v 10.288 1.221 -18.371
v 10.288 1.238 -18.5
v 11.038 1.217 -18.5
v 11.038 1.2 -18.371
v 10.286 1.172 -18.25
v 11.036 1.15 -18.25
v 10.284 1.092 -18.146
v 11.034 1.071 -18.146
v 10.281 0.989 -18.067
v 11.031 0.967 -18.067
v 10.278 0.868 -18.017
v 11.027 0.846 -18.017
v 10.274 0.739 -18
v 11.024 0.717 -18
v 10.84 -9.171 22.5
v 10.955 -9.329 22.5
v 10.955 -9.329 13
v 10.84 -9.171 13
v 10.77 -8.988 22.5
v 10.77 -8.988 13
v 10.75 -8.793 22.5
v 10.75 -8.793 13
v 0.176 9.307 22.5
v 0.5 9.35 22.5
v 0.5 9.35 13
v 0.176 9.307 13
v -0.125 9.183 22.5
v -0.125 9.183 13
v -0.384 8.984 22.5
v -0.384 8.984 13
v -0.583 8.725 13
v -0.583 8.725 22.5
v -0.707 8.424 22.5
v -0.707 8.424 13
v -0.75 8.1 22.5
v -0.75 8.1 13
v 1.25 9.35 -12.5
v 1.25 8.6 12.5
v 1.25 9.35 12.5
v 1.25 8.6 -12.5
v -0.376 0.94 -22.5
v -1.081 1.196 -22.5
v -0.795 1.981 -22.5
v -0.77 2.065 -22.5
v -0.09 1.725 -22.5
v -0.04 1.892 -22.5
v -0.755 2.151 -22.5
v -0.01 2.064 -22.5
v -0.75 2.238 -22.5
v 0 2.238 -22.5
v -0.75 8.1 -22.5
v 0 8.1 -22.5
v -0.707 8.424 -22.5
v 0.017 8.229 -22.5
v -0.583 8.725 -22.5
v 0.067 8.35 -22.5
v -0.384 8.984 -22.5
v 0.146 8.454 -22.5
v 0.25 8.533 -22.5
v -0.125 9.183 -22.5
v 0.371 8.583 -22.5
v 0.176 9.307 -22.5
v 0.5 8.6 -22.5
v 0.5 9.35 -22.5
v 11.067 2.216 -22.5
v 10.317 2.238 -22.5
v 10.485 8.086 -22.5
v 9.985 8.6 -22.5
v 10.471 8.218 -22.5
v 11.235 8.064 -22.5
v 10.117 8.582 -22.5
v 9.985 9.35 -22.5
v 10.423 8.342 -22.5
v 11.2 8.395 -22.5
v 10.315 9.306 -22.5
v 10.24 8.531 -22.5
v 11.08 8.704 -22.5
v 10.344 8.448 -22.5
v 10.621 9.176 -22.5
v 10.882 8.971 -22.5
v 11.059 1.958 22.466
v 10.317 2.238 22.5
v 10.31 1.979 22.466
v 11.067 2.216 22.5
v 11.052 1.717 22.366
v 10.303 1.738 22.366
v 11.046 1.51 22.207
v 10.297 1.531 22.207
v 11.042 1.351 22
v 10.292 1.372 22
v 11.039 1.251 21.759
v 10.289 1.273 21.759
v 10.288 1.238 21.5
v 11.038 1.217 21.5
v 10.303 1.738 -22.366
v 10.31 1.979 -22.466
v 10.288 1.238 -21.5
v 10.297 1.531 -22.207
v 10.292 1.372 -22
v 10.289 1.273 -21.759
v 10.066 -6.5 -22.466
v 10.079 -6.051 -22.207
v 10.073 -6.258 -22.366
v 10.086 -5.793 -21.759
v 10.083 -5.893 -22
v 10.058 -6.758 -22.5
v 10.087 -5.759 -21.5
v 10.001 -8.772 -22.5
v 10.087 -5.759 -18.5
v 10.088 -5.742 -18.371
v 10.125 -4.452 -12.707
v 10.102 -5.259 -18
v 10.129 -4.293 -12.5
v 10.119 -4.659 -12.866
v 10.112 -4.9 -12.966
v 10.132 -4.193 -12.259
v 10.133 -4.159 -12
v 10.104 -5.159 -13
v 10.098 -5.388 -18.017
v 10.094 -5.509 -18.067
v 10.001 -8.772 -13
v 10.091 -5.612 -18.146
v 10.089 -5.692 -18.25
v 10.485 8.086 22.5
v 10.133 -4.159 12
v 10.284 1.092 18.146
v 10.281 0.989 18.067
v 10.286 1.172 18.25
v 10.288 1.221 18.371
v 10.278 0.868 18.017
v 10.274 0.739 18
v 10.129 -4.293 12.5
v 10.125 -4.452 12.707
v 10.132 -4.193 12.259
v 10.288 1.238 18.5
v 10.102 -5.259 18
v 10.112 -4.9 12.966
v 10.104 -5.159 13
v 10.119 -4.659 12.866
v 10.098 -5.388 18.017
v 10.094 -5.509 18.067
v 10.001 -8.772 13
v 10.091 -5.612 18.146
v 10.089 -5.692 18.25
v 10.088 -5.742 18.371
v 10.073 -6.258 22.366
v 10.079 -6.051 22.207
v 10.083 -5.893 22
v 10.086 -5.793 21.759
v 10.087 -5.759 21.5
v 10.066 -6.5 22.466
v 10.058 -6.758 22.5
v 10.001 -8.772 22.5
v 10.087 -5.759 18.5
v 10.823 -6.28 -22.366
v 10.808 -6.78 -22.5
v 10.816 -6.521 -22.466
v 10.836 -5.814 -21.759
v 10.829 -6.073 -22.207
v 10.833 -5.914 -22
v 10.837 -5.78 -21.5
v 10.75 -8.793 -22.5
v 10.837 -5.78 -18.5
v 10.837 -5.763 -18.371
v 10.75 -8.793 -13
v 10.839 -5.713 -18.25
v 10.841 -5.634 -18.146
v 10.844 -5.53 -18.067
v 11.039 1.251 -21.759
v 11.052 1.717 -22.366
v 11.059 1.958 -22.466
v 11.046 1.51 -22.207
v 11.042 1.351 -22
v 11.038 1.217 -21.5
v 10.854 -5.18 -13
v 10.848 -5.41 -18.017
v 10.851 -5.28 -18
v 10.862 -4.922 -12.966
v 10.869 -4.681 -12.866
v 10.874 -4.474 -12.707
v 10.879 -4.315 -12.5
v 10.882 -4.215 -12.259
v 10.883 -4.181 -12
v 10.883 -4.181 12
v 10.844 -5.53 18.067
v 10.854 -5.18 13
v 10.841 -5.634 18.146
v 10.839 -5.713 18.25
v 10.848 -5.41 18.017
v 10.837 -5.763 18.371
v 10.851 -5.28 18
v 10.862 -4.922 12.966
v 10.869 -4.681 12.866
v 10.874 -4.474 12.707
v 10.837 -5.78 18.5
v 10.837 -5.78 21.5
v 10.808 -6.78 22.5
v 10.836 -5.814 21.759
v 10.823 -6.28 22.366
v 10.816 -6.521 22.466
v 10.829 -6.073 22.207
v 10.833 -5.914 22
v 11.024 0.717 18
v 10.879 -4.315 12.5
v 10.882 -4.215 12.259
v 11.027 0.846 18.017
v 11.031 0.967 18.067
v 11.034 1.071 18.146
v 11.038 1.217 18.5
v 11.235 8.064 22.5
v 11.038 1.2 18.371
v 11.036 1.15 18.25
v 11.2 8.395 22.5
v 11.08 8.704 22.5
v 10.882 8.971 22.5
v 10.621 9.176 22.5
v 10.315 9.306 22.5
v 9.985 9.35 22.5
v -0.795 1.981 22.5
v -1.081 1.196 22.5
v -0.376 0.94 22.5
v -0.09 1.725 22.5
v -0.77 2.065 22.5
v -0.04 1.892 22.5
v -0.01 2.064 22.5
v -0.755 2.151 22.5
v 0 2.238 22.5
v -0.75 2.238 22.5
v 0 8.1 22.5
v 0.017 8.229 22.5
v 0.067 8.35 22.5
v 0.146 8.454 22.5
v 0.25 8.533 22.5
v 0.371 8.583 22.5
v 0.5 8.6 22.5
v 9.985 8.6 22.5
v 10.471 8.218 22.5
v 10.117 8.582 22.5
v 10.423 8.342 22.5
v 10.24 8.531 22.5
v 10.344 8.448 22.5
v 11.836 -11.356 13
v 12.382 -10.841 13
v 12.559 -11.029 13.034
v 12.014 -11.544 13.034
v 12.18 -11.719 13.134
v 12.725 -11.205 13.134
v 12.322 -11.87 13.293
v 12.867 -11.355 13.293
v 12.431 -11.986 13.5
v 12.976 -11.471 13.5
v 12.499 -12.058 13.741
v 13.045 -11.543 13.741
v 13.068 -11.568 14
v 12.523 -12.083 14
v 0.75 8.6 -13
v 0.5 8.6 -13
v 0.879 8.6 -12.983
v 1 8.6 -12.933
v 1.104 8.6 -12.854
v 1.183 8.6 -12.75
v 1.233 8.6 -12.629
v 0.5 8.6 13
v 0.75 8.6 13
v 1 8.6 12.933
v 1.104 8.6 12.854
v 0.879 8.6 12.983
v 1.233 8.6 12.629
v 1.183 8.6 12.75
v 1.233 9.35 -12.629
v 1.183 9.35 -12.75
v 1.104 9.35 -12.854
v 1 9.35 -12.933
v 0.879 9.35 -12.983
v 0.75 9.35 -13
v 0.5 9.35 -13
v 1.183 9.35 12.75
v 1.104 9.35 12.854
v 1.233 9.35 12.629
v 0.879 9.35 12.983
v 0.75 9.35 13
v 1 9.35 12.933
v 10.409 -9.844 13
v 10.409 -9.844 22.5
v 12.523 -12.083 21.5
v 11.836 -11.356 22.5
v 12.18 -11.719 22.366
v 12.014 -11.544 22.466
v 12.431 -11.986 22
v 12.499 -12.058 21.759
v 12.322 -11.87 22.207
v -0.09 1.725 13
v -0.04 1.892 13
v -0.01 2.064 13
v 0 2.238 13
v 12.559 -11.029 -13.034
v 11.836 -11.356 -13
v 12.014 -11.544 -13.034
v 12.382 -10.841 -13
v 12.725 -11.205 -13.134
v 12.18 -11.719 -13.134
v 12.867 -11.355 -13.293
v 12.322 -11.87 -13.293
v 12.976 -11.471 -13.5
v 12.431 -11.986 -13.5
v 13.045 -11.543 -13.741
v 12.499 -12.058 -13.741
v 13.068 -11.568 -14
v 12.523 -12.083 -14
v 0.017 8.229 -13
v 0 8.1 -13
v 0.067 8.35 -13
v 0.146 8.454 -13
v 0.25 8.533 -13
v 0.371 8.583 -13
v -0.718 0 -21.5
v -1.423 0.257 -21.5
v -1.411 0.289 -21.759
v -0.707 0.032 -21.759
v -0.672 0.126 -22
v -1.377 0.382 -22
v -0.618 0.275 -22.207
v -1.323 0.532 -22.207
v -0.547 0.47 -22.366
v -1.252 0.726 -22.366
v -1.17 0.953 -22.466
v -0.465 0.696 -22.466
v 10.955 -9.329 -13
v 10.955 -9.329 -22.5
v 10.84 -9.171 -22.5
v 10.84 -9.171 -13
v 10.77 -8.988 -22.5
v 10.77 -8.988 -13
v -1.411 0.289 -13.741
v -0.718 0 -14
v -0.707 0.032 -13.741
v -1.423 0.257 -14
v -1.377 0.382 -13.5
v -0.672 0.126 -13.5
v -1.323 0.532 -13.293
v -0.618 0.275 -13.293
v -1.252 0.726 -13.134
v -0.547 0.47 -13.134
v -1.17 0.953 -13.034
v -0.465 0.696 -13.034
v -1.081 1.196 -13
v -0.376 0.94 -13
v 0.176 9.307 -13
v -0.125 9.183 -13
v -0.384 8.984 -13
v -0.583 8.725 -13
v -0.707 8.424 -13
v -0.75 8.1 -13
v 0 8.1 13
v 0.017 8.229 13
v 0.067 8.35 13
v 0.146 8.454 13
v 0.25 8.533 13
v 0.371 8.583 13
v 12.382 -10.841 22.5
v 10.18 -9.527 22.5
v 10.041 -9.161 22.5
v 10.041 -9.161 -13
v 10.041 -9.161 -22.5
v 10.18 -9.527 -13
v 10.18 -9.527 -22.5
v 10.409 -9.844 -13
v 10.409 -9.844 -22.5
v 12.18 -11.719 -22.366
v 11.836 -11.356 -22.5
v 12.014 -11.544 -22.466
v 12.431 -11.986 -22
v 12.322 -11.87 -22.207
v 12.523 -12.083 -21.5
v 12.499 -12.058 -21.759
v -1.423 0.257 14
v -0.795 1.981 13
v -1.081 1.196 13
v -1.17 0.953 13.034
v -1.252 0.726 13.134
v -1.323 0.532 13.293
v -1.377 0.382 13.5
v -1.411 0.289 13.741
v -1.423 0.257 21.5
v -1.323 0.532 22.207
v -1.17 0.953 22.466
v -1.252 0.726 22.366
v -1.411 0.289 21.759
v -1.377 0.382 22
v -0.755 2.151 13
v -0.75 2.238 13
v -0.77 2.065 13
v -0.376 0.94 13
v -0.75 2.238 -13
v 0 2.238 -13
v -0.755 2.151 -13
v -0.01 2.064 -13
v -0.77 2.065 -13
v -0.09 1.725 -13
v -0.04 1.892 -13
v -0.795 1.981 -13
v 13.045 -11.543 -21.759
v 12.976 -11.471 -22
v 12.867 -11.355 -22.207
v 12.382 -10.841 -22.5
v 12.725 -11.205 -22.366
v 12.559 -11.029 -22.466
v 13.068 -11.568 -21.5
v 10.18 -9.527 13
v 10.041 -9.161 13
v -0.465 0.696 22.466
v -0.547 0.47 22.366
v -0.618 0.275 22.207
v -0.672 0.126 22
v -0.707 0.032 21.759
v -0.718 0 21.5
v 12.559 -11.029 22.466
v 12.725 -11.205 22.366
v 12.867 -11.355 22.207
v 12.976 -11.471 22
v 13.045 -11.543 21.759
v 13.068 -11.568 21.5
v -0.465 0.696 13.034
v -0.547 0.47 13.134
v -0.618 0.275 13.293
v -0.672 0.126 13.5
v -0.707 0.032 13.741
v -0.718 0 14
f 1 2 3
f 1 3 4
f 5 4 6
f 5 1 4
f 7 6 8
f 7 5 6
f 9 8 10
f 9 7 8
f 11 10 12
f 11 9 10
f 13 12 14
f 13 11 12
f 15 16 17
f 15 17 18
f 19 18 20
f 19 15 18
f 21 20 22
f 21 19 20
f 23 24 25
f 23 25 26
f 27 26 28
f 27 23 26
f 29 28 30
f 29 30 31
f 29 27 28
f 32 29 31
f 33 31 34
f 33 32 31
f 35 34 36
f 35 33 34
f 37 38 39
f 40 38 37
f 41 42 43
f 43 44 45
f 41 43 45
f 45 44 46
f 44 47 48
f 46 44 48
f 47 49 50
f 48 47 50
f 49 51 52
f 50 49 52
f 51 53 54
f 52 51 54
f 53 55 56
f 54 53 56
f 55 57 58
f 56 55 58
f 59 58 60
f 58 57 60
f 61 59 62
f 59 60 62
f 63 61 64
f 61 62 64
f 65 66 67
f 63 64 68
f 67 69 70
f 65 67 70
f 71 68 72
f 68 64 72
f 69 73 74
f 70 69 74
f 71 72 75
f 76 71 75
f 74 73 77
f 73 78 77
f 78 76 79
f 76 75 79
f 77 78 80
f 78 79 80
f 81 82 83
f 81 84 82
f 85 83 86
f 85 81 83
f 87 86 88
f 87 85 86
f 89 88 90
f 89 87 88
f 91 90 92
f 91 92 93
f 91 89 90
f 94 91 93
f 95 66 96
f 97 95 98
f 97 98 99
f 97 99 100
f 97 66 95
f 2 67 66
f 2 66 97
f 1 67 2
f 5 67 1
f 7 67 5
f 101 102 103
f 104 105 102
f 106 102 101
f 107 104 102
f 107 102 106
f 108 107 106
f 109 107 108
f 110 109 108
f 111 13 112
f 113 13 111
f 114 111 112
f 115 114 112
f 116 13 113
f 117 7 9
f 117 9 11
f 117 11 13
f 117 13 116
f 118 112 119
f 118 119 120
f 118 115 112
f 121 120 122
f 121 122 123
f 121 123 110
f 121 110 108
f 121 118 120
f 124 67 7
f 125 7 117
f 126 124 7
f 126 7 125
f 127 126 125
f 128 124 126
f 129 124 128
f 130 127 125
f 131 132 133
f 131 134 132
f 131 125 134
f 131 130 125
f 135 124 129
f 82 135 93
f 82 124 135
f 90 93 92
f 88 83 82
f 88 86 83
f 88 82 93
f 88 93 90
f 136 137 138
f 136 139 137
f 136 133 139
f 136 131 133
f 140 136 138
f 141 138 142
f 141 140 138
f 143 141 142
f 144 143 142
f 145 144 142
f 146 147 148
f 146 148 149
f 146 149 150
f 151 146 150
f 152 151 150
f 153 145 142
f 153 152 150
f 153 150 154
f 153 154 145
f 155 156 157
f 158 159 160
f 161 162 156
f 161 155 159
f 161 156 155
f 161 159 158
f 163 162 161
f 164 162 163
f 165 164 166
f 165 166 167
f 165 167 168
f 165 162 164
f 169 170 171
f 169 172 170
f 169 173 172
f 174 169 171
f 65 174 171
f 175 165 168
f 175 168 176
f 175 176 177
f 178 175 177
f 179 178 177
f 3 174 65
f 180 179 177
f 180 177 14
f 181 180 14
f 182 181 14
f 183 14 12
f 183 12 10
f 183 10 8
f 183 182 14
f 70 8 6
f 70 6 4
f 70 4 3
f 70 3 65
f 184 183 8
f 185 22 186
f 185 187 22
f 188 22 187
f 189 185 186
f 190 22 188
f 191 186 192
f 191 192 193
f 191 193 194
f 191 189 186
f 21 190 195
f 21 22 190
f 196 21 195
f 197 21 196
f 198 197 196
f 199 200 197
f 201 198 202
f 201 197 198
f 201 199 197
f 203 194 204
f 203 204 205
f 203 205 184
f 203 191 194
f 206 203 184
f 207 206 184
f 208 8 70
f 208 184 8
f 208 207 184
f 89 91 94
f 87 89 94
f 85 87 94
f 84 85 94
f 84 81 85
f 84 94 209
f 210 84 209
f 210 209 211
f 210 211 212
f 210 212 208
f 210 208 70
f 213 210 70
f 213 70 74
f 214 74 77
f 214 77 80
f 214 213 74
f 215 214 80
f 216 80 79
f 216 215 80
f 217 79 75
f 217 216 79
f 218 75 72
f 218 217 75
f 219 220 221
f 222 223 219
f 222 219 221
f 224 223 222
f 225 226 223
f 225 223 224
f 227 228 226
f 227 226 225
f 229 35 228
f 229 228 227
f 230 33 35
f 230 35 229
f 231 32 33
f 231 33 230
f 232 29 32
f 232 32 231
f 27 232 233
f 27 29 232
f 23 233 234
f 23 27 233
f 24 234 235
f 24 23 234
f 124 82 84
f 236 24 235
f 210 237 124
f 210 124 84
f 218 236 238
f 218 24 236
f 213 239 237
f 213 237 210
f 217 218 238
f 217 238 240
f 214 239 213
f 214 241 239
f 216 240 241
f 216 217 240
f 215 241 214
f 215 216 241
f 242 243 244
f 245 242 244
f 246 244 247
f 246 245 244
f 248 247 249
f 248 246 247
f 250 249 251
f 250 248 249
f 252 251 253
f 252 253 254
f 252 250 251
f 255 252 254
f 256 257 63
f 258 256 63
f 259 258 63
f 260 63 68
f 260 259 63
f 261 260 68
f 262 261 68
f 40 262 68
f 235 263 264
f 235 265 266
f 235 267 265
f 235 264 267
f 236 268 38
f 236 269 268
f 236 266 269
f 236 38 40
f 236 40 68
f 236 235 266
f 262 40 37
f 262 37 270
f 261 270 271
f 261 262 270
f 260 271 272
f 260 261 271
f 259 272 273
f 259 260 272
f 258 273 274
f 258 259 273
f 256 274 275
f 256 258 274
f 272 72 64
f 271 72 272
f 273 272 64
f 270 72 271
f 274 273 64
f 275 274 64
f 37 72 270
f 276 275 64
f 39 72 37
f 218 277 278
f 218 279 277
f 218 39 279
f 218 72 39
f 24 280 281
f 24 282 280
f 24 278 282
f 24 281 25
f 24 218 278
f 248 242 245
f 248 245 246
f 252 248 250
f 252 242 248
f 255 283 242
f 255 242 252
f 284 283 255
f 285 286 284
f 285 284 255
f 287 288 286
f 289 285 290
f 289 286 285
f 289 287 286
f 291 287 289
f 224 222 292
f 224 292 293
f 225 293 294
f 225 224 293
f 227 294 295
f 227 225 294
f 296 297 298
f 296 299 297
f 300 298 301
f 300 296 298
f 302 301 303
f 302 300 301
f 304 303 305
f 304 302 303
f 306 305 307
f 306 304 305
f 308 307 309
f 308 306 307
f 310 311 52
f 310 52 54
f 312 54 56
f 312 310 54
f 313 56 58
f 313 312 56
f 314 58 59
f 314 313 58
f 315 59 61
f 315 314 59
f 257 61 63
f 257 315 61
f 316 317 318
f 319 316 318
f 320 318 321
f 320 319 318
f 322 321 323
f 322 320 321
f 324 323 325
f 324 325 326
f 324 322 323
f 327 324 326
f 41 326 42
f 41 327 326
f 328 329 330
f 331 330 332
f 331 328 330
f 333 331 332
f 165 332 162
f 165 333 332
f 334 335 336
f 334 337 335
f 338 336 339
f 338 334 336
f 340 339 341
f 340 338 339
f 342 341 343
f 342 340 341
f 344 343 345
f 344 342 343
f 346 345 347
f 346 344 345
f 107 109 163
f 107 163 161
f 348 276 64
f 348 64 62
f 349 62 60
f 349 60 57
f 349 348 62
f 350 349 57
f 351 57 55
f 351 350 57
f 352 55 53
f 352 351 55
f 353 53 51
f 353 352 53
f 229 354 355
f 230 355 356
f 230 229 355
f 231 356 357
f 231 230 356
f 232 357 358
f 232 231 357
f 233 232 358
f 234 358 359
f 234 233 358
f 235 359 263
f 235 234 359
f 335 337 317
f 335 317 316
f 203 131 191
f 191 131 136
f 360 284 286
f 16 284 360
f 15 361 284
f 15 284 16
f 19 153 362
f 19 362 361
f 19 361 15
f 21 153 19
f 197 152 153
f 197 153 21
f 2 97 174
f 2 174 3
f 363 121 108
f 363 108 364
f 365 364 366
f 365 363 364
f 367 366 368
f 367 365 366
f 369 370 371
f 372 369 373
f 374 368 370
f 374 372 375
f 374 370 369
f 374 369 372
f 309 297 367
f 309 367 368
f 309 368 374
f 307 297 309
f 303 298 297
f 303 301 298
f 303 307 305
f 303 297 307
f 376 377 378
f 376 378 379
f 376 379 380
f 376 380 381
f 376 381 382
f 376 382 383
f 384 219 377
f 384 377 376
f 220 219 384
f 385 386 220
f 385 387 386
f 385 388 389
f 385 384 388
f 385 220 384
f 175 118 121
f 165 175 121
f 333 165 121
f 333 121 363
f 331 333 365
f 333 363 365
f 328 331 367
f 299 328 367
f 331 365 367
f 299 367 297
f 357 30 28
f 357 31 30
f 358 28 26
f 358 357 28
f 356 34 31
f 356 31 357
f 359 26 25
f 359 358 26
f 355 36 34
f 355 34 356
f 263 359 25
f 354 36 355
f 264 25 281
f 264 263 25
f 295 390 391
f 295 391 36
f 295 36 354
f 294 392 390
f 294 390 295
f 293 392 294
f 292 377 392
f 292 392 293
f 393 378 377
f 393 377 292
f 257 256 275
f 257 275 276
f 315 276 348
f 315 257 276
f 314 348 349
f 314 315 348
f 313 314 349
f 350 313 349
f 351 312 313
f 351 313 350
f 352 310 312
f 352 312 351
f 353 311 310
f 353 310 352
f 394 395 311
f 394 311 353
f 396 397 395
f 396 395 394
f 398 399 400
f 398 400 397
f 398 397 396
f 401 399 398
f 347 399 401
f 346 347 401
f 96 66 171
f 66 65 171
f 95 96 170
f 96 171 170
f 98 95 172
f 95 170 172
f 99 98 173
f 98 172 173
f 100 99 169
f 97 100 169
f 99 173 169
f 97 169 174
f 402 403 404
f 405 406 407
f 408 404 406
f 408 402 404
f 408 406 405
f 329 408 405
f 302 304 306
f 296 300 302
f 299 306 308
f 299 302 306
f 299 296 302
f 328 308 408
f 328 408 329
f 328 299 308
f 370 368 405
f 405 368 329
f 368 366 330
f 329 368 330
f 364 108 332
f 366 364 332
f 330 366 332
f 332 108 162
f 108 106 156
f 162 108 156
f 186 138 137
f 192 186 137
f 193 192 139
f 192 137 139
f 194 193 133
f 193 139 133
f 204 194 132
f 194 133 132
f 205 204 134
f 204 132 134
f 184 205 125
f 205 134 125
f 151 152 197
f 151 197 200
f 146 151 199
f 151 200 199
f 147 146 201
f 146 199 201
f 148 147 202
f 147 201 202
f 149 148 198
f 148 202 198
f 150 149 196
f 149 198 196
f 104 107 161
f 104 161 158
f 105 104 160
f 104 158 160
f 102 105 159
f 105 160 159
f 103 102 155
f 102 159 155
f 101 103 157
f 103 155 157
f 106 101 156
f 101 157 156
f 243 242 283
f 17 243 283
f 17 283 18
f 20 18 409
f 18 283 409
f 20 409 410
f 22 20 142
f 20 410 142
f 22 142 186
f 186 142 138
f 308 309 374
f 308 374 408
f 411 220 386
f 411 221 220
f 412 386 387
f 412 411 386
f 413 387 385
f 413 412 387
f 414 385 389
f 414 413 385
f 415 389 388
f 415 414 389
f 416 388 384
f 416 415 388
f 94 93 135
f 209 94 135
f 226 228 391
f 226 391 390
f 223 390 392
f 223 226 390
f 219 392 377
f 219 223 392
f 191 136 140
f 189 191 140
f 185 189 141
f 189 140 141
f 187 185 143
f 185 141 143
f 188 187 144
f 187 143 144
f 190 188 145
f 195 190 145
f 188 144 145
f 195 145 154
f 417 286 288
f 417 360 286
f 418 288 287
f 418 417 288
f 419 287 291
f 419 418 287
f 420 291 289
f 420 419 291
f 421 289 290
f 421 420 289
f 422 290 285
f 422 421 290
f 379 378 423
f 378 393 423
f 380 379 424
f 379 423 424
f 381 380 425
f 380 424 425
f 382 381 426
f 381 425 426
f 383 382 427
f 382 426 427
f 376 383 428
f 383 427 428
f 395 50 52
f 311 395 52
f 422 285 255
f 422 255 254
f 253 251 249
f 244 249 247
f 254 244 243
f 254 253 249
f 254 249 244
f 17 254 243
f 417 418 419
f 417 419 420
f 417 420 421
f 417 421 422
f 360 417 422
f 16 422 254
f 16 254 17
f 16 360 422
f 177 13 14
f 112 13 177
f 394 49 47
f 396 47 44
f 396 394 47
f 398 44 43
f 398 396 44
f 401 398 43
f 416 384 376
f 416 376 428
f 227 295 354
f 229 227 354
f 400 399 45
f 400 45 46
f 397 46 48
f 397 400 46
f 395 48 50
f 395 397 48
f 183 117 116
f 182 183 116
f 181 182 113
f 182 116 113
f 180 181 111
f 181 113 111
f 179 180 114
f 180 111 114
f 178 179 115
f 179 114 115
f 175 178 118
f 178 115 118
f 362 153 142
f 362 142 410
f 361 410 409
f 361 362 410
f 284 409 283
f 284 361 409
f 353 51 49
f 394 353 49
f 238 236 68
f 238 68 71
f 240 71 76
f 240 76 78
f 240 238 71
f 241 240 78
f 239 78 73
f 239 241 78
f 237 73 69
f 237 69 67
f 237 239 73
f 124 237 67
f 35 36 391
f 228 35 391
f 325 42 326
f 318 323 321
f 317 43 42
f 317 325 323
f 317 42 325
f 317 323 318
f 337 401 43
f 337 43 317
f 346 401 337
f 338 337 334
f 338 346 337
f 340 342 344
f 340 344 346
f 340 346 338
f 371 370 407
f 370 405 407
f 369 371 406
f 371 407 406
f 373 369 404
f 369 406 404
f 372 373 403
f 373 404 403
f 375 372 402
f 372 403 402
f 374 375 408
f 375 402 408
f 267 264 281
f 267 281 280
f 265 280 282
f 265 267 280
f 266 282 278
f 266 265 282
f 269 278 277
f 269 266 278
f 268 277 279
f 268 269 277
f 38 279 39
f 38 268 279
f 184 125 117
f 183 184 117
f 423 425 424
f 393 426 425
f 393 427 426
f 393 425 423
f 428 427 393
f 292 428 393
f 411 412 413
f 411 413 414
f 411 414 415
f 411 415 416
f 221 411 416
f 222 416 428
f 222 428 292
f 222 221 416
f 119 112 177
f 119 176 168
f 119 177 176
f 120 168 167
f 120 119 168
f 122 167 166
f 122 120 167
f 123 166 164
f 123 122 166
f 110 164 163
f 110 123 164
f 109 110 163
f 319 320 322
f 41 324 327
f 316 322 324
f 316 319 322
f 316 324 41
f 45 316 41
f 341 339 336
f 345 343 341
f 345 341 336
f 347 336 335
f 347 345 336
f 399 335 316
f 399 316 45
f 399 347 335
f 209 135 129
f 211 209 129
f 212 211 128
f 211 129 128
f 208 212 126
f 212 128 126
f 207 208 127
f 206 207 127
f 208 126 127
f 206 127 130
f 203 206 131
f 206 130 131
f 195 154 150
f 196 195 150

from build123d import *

# Parameters (mm, degrees)
BASE_FLANGE1_DEPTH = 22.5
CUT_EXTRUDE1_START = -9.35
CUT_EXTRUDE1_DEPTH = 9.35
CUT_EXTRUDE2_DEPTH = 28.952537171
FILLET_R1_R        = 1


# Read off the part's stored shape, not the designer's step: Cut-Extrude1
# Sheet-metal steps are written as plain solids
with BuildPart() as part:
    # Sketch1 → Base-Flange1 (new, symmetric)
    with BuildSketch(Plane.XY):
        with BuildLine():
            Line((-0.718242301, 0), (-0.090461069, 1.72481476))
            ThreePointArc((-0.090461069, 1.72481476), (-0.02278837, 1.977372708), (0, 2.237844975))
            Line((0, 2.237844975), (0, 8.1))
            ThreePointArc((0, 8.1), (0.146446609, 8.453553391), (0.5, 8.6))
            Line((0.5, 8.6), (9.985419886, 8.6))
            ThreePointArc((9.985419886, 8.6), (10.344017022, 8.448436644), (10.485213415, 8.085632378))
            Line((10.485213415, 8.085632378), (10.000619414, -8.771503263))
            ThreePointArc((10.000619414, -8.771503263), (10.098258212, -9.348572383), (10.409299492, -9.84434998))
            Line((10.409299492, -9.84434998), (12.522800458, -12.082961625))
            Line((12.522800458, -12.082961625), (13.068150712, -11.568089698))
            Line((13.068150712, -11.568089698), (10.954649746, -9.329478054))
            ThreePointArc((10.954649746, -9.329478054), (10.799129106, -9.081589256), (10.750309707, -8.793054696))
            Line((10.750309707, -8.793054696), (11.234903709, 8.064080946))
            ThreePointArc((11.234903709, 8.064080946), (10.881912725, 8.971091609), (9.985419886, 9.35))
            Line((9.985419886, 9.35), (0.5, 9.35))
            ThreePointArc((0.5, 9.35), (-0.383883476, 8.983883476), (-0.75, 8.1))
            Line((-0.75, 8.1), (-0.75, 2.237844975))
            ThreePointArc((-0.75, 2.237844975), (-0.761394185, 2.107608841), (-0.795230534, 1.981329867))
            Line((-0.795230534, 1.981329867), (-1.423011767, 0.256515107))
            Line((-1.423011767, 0.256515107), (-0.718242301, 0))
        make_face()
    extrude(amount=BASE_FLANGE1_DEPTH, both=True)

    # Cut-Extrude1 outline → Cut-Extrude1 (cut)
    with BuildSketch(Plane(origin=(0, 9.35, 0), x_dir=(-1, 0, 0), z_dir=(0, 1, 0)).offset(CUT_EXTRUDE1_START)):
        with BuildLine():
            ThreePointArc((-0.75, 13), (-1.103553391, 12.853553391), (-1.25, 12.5))
            Line((-1.25, 12.5), (-1.25, -12.5))
            ThreePointArc((-1.25, -12.5), (-1.103553391, -12.853553391), (-0.75, -13))
            Line((-0.75, -13), (3, -13))
            Line((3, -13), (3, 13))
            Line((3, 13), (-0.75, 13))
        make_face()
    extrude(amount=CUT_EXTRUDE1_DEPTH, mode=Mode.SUBTRACT)

    # Sketch5 → Cut-Extrude2 (cut, through all)
    with BuildSketch(Plane(origin=(10.244308957, -0.294494318, 0), x_dir=(0, 0, -1), z_dir=(0.999587057638364, -0.02873524320200468, 0))):
        with BuildLine():
            Line((-22.5, 1.533588636), (-18.5, 1.533588636))
            ThreePointArc((-18.5, 1.533588636), (-18.146446609, 1.387142026), (-18, 1.033588636))
            Line((-18, 1.033588636), (-18, -4.966411364))
            ThreePointArc((-18, -4.966411364), (-18.146446609, -5.319964755), (-18.5, -5.466411364))
            Line((-18.5, -5.466411364), (-22.5, -5.466411364))
            Line((-22.5, -5.466411364), (-22.5, 1.533588636))
        make_face()
        with BuildLine():
            Line((18, 1.033588636), (18, -4.966411364))
            ThreePointArc((18, -4.966411364), (18.146446609, -5.319964755), (18.5, -5.466411364))
            Line((18.5, -5.466411364), (22.5, -5.466411364))
            Line((22.5, -5.466411364), (22.5, 1.533588636))
            Line((22.5, 1.533588636), (18.5, 1.533588636))
            ThreePointArc((18.5, 1.533588636), (18.146446609, 1.387142026), (18, 1.033588636))
        make_face()
        with BuildLine():
            Line((-12, -3.866411364), (12, -3.866411364))
            ThreePointArc((12, -3.866411364), (12.707106781, -4.159304583), (13, -4.866411364))
            Line((13, -4.866411364), (13, -11.718126341))
            Line((13, -11.718126341), (-13, -11.718126341))
            Line((-13, -11.718126341), (-13, -4.866411364))
            ThreePointArc((-13, -4.866411364), (-12.707106781, -4.159304583), (-12, -3.866411364))
        make_face()
    extrude(amount=CUT_EXTRUDE2_DEPTH, mode=Mode.SUBTRACT)

    # R1
    fillet_r1_edges = [part.edges().sort_by_distance(p)[0] for p in [
        (10.663222146, 1.227685317, -22.5),
        (10.462075444, -5.769424086, -22.5),
        (-1.070627034, 0.128257554, -22.5),
        (12.795475585, -11.825525661, 13),
        (12.795475585, -11.825525661, -13),
        (10.663222146, 1.227685317, 22.5),
        (10.462075444, -5.769424086, 22.5),
        (12.795475585, -11.825525661, -22.5),
        (-1.070627034, 0.128257554, 22.5),
        (12.795475585, -11.825525661, 22.5),
        (-1.070627034, 0.128257554, 13),
        (-1.070627034, 0.128257554, -13),
    ]]
    fillet(fillet_r1_edges, radius=FILLET_R1_R)


solid = part.part
